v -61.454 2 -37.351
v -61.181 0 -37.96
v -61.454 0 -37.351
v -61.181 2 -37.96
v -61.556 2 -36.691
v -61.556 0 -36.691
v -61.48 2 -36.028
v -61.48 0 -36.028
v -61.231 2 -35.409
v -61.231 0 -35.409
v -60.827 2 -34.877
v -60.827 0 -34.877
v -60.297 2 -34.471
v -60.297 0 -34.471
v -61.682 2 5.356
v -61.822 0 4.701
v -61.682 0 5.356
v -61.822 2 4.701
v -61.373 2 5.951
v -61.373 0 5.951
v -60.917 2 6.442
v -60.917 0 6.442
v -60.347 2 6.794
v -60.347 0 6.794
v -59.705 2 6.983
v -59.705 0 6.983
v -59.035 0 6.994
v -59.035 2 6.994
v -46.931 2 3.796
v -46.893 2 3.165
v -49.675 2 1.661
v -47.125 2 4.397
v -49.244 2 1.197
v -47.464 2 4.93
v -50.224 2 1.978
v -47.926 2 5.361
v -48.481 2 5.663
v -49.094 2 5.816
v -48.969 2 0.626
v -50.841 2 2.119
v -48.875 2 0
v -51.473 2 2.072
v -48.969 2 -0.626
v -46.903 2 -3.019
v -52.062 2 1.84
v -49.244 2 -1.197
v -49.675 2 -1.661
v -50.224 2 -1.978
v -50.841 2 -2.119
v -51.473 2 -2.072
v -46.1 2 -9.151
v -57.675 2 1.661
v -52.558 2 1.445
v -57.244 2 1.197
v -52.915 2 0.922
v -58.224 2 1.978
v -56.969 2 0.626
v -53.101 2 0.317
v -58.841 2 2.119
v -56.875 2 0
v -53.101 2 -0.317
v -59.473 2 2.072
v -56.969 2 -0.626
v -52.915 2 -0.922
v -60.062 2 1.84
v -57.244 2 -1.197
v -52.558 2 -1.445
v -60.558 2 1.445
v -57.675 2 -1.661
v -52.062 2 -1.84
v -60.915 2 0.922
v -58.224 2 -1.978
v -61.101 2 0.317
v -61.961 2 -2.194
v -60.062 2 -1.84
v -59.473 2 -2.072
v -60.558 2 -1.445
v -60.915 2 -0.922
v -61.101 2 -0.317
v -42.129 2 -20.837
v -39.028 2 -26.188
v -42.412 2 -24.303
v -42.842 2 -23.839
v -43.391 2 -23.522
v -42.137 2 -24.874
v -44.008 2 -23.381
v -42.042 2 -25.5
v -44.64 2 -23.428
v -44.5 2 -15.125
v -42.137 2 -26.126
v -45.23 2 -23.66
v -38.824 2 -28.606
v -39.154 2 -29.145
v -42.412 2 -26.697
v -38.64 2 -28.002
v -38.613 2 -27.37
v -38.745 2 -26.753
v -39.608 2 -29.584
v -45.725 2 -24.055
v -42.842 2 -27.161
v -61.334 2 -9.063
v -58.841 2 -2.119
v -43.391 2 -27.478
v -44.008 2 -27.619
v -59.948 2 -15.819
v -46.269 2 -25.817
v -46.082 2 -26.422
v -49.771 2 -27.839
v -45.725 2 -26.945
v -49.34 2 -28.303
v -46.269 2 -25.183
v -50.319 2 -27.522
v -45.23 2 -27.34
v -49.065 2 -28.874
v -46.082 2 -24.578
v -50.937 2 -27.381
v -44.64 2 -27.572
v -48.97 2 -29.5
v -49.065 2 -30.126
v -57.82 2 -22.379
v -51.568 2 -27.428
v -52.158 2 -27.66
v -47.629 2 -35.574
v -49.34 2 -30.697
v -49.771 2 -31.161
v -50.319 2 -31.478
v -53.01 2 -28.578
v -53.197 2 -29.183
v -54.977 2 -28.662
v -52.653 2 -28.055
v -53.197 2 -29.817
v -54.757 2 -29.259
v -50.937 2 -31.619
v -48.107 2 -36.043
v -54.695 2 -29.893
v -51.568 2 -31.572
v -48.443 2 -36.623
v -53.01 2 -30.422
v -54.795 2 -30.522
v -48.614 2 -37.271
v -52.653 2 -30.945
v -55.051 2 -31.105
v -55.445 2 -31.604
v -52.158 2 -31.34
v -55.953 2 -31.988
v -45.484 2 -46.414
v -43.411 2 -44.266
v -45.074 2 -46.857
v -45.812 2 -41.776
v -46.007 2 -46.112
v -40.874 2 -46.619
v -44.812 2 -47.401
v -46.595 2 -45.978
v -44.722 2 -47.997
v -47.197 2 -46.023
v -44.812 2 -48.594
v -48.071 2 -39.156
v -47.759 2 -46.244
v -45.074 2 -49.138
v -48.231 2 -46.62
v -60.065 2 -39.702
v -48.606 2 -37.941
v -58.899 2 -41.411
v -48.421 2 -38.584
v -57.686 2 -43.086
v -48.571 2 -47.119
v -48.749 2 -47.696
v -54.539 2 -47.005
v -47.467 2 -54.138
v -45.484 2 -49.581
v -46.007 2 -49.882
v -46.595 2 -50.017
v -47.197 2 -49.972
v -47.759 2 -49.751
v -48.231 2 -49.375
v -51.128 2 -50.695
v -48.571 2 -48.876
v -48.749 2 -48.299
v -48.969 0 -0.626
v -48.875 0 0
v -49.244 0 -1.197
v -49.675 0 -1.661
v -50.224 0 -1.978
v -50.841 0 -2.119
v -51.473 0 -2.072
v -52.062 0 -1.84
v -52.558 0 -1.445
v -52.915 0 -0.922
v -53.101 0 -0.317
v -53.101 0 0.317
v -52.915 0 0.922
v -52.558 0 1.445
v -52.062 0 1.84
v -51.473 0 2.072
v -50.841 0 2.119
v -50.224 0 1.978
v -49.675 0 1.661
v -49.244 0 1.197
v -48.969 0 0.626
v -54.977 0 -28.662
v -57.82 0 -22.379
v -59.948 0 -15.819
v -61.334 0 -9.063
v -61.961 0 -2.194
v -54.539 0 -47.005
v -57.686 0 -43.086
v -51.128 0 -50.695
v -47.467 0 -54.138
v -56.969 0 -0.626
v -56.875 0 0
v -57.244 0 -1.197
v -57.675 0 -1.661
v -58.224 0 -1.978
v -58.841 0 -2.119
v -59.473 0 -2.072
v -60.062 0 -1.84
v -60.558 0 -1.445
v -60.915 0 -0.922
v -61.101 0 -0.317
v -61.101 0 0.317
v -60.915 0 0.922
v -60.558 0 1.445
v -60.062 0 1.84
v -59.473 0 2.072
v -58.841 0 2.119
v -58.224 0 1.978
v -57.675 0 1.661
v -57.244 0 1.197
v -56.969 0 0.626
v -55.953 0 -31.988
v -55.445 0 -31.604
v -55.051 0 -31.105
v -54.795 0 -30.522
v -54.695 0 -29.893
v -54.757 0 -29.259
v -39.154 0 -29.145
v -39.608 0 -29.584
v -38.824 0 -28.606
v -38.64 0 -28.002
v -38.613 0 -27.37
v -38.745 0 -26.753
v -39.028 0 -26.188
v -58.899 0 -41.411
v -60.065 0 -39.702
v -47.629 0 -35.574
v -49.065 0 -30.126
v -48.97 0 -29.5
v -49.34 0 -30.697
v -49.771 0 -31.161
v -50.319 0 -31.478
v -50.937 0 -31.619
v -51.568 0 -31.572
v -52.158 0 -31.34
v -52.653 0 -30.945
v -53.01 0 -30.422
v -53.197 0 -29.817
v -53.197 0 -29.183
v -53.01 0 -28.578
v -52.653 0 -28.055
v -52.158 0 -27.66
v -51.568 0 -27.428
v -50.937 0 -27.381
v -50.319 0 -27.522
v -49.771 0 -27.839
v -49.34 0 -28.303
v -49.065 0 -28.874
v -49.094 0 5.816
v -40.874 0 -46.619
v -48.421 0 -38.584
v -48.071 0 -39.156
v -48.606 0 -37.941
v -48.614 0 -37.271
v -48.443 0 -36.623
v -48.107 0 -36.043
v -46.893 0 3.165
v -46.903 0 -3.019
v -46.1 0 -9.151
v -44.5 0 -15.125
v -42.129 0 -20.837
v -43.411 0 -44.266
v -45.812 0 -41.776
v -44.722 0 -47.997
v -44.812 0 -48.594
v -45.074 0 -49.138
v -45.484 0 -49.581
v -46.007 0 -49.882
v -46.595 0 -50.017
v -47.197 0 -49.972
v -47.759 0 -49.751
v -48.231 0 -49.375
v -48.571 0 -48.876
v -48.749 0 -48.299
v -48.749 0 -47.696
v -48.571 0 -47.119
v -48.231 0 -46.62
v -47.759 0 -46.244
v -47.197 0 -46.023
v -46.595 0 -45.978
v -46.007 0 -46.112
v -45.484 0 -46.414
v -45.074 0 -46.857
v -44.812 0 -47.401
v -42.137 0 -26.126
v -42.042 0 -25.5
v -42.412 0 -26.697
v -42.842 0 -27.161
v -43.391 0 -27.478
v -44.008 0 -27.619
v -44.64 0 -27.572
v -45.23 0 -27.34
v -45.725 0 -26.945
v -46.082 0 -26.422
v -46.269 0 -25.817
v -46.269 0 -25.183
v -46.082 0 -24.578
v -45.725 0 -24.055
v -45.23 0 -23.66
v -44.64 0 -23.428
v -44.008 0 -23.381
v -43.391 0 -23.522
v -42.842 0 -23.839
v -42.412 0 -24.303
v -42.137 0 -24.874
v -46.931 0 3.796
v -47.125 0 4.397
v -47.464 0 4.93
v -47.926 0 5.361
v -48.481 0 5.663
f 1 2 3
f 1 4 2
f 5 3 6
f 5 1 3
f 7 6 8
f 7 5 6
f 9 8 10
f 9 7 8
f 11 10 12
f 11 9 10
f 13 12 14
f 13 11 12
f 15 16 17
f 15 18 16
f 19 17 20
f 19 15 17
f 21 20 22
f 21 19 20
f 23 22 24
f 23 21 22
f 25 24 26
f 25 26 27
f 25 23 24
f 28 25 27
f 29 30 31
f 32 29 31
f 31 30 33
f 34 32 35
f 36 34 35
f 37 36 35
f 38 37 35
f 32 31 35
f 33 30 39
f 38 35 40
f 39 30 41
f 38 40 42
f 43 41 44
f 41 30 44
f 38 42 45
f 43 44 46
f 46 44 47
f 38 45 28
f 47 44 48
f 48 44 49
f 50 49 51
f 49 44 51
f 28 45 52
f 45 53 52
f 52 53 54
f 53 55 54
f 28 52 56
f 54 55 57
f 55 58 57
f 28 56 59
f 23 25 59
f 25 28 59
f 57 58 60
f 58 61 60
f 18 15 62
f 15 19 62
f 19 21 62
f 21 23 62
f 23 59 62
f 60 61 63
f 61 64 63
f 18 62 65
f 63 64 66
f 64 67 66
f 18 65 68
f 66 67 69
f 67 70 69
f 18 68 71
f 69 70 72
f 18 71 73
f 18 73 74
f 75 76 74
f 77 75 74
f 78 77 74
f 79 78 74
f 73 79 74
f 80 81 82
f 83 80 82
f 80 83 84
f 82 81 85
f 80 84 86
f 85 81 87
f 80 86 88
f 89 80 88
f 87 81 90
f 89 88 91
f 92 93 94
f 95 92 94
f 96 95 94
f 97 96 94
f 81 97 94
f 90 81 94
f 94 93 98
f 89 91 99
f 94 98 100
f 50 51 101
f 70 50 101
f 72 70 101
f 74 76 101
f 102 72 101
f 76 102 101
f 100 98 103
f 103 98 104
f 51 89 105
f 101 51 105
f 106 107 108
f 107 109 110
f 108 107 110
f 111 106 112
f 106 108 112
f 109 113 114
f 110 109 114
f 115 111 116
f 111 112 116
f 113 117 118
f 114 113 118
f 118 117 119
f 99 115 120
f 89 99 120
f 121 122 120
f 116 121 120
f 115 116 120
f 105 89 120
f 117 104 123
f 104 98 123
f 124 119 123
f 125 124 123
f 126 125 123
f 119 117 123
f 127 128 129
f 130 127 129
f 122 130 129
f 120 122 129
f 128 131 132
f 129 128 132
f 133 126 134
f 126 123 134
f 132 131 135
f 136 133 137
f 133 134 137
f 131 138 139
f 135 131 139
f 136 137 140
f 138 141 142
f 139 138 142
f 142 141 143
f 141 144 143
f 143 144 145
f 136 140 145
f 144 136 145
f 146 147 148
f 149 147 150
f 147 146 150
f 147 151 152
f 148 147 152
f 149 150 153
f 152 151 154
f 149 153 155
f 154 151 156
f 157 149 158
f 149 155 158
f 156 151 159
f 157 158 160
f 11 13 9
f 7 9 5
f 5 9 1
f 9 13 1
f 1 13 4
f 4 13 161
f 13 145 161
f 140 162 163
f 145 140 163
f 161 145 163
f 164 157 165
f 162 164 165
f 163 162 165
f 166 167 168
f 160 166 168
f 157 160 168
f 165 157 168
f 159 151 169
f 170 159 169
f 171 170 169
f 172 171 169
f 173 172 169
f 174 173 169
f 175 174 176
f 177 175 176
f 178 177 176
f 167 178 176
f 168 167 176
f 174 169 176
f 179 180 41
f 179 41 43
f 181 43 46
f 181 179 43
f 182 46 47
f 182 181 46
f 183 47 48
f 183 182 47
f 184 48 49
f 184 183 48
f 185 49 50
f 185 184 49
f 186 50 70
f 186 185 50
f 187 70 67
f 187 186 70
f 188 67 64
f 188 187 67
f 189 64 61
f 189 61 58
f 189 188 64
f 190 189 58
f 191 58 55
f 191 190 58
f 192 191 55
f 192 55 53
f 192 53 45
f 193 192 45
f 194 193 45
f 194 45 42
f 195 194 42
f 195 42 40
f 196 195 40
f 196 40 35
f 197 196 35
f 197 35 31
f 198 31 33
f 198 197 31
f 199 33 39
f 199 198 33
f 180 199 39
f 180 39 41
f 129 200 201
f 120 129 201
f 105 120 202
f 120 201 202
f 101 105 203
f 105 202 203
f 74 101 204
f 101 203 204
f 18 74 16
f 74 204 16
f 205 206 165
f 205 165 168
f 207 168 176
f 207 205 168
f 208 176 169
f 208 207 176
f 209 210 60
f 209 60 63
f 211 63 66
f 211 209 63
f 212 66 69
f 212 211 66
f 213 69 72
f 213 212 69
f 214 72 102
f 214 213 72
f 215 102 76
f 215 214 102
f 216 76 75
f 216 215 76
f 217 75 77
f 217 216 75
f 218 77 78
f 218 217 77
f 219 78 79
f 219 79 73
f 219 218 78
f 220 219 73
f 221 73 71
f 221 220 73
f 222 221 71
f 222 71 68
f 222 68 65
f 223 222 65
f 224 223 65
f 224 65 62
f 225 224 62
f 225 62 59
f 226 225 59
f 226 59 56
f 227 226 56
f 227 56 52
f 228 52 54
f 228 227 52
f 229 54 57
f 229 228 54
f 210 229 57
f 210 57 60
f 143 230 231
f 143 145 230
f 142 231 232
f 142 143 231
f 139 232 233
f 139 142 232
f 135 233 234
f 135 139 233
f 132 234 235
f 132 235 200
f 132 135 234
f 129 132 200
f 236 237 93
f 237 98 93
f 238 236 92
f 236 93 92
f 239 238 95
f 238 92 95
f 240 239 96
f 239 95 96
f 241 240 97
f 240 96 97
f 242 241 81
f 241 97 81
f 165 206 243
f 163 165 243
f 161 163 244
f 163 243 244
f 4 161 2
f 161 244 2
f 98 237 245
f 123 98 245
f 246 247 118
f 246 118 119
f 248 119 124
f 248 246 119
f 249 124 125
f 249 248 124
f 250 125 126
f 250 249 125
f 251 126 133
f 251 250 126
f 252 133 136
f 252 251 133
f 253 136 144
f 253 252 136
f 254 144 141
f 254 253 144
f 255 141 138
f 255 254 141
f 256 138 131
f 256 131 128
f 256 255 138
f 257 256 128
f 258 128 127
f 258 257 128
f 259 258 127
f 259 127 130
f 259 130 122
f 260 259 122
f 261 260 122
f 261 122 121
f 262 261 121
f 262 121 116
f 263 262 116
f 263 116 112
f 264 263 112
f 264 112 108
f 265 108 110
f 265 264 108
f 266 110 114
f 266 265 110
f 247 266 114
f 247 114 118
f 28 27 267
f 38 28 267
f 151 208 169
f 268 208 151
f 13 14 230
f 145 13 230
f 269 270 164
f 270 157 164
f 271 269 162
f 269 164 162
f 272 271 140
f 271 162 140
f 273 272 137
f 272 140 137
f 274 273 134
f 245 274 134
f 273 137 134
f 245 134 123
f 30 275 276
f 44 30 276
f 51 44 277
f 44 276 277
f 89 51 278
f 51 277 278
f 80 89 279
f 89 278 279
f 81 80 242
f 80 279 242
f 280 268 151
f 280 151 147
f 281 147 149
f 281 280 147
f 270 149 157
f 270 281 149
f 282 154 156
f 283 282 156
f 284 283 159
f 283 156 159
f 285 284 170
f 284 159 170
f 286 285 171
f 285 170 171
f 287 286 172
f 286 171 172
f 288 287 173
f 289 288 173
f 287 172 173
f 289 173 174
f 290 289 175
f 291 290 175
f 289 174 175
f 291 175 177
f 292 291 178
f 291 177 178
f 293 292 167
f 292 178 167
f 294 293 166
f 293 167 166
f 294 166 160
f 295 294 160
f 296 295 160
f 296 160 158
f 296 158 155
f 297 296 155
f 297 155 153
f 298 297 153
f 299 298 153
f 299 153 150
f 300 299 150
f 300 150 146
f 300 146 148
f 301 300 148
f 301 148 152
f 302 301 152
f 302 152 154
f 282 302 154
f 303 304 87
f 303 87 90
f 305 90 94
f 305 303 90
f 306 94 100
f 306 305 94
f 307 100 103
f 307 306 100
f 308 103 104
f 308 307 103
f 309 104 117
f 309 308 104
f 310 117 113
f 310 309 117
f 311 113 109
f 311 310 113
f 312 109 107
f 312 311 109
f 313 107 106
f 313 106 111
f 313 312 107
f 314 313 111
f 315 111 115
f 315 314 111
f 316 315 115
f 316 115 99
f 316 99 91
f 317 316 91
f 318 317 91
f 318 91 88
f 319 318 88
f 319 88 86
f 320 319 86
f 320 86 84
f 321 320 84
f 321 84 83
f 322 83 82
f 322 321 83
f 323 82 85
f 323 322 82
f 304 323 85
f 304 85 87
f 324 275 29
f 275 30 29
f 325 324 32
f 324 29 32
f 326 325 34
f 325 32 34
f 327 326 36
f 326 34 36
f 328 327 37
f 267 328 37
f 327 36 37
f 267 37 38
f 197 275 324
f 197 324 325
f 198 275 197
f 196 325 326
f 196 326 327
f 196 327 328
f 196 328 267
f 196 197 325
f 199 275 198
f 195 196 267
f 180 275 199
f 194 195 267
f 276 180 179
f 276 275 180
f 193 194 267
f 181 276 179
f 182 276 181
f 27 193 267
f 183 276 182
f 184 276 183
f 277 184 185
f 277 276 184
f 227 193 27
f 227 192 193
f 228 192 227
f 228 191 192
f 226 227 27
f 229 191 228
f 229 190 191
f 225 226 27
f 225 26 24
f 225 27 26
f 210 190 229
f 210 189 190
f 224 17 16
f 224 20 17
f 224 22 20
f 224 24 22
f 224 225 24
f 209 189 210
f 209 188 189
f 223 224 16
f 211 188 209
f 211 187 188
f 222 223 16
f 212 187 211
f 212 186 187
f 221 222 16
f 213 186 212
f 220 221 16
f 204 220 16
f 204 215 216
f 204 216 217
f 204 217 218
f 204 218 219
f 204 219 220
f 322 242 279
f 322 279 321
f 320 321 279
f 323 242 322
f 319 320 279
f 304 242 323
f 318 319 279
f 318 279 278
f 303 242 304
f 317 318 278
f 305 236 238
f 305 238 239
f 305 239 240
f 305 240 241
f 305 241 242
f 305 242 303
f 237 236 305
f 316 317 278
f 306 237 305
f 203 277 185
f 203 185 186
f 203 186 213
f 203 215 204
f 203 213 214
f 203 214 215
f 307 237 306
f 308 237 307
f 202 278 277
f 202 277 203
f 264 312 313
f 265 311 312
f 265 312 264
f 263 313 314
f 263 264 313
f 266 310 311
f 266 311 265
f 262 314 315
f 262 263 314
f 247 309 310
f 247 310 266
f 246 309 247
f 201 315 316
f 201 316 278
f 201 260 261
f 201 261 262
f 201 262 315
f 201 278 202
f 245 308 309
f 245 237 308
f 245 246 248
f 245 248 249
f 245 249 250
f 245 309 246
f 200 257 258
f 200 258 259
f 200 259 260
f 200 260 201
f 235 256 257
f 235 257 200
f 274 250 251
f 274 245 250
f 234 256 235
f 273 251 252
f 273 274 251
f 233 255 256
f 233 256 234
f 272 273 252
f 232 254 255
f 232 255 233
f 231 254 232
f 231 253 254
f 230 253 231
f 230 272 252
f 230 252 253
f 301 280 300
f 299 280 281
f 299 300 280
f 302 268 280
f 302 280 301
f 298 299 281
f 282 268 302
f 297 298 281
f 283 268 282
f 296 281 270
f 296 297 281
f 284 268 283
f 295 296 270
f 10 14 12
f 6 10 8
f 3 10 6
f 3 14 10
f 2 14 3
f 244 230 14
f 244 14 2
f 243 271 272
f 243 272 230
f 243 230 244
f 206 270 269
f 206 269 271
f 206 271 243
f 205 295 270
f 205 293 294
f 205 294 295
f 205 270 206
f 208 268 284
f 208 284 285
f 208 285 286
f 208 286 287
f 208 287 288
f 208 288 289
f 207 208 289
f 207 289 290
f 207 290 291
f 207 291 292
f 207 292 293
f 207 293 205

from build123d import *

# Parameters (mm, degrees)
SKETCH1_R               = 2.125
BOSS_EXTRUDE1_DEPTH     = 2
BOSS_EXTRUDE3_DEPTH     = 2
BOSS_EXTRUDE4_DEPTH     = 2
FILLET1_R               = 2.5
SKETCH6_R               = 2.025
CUT_EXTRUDE1_DEPTH      = 1
CUT_EXTRUDE1_DEPTH_BACK = 3


with BuildPart() as part:
    # Sketch1 → Boss-Extrude1 (new body)
    with BuildSketch(Plane(origin=(0, 0, 0), x_dir=(1, 0, 0), z_dir=(0, 1, 0))):
        with BuildLine():
            Line((-37.655823606, 28.125414637), (-49.673639651, 37.101610798))
            ThreePointArc((-49.673639651, 37.101610798), (-59.88740123, 16.046780796), (-61.569439235, -7.294117647))
            Line((-61.569439235, -7.294117647), (-46.673607162, -5.529411765))
            ThreePointArc((-46.673607162, -5.529411765), (-45.398513836, 12.16449512), (-37.655823606, 28.125414637))
        make_face()
        with Locations((-44.167295593, 25.5)):
            Circle(SKETCH1_R, mode=Mode.SUBTRACT)
        with Locations((-51.095498823, 29.5)):
            Circle(SKETCH1_R, mode=Mode.SUBTRACT)
        with Locations((-59, 0)):
            Circle(SKETCH1_R, mode=Mode.SUBTRACT)
        with Locations((-51, 0)):
            Circle(SKETCH1_R, mode=Mode.SUBTRACT)
    extrude(amount=BOSS_EXTRUDE1_DEPTH)

    # Sketch3 → Boss-Extrude3 (add)
    with BuildSketch(Plane(origin=(0, 0, 0), x_dir=(1, 0, 0), z_dir=(0, 1, 0))):
        with BuildLine():
            Line((-62.506368953, 35.734490906), (-53.824928821, 30.771367169))
            ThreePointArc((-53.824928821, 30.771367169), (-51.845987454, 33.999905661), (-49.673639651, 37.101610798))
            Line((-49.673639651, 37.101610798), (-57.685517014, 43.085741572))
            ThreePointArc((-57.685517014, 43.085741572), (-60.208243494, 39.483761413), (-62.506368953, 35.734490906))
        make_face()
    extrude(amount=BOSS_EXTRUDE3_DEPTH)

    # Sketch5 → Boss-Extrude4 (add)
    with BuildSketch(Plane(origin=(0, 0, 0), x_dir=(1, 0, 0), z_dir=(0, 1, 0))):
        with BuildLine():
            Line((-47.466920684, 54.137708123), (-40.874292811, 46.618581995))
            ThreePointArc((-40.874292811, 46.618581995), (-45.523347894, 42.09067351), (-49.673639651, 37.101610798))
            Line((-49.673639651, 37.101610798), (-57.685517014, 43.085741572))
            ThreePointArc((-57.685517014, 43.085741572), (-52.865823361, 48.879491818), (-47.466920684, 54.137708123))
        make_face()
    extrude(amount=BOSS_EXTRUDE4_DEPTH)

    # Fillet1
    fillet1_edges = [part.edges().sort_by_distance(p)[0] for p in [
        (-53.824928821, 1, -30.771367169),
        (-62.506368953, 1, -35.734490906),
        (-49.673639651, 1, -37.101610798),
        (-46.673607162, 1, 5.529411765),
        (-61.569439235, 1, 7.294117647),
        (-37.655823606, 1, -28.125414637),
    ]]
    fillet(fillet1_edges, radius=FILLET1_R)

    # Sketch6 → Cut-Extrude1 (cut, two sides)
    with BuildSketch(Plane(origin=(0, 2, 0), x_dir=(1, 0, 0), z_dir=(0, 1, 0))) as cut_extrude1_sk:
        with Locations((-46.746660862, 47.99739262)):
            Circle(SKETCH6_R)
    extrude(amount=CUT_EXTRUDE1_DEPTH, mode=Mode.SUBTRACT)
    extrude(cut_extrude1_sk.sketch, amount=-CUT_EXTRUDE1_DEPTH_BACK, mode=Mode.SUBTRACT)


solid = part.part
